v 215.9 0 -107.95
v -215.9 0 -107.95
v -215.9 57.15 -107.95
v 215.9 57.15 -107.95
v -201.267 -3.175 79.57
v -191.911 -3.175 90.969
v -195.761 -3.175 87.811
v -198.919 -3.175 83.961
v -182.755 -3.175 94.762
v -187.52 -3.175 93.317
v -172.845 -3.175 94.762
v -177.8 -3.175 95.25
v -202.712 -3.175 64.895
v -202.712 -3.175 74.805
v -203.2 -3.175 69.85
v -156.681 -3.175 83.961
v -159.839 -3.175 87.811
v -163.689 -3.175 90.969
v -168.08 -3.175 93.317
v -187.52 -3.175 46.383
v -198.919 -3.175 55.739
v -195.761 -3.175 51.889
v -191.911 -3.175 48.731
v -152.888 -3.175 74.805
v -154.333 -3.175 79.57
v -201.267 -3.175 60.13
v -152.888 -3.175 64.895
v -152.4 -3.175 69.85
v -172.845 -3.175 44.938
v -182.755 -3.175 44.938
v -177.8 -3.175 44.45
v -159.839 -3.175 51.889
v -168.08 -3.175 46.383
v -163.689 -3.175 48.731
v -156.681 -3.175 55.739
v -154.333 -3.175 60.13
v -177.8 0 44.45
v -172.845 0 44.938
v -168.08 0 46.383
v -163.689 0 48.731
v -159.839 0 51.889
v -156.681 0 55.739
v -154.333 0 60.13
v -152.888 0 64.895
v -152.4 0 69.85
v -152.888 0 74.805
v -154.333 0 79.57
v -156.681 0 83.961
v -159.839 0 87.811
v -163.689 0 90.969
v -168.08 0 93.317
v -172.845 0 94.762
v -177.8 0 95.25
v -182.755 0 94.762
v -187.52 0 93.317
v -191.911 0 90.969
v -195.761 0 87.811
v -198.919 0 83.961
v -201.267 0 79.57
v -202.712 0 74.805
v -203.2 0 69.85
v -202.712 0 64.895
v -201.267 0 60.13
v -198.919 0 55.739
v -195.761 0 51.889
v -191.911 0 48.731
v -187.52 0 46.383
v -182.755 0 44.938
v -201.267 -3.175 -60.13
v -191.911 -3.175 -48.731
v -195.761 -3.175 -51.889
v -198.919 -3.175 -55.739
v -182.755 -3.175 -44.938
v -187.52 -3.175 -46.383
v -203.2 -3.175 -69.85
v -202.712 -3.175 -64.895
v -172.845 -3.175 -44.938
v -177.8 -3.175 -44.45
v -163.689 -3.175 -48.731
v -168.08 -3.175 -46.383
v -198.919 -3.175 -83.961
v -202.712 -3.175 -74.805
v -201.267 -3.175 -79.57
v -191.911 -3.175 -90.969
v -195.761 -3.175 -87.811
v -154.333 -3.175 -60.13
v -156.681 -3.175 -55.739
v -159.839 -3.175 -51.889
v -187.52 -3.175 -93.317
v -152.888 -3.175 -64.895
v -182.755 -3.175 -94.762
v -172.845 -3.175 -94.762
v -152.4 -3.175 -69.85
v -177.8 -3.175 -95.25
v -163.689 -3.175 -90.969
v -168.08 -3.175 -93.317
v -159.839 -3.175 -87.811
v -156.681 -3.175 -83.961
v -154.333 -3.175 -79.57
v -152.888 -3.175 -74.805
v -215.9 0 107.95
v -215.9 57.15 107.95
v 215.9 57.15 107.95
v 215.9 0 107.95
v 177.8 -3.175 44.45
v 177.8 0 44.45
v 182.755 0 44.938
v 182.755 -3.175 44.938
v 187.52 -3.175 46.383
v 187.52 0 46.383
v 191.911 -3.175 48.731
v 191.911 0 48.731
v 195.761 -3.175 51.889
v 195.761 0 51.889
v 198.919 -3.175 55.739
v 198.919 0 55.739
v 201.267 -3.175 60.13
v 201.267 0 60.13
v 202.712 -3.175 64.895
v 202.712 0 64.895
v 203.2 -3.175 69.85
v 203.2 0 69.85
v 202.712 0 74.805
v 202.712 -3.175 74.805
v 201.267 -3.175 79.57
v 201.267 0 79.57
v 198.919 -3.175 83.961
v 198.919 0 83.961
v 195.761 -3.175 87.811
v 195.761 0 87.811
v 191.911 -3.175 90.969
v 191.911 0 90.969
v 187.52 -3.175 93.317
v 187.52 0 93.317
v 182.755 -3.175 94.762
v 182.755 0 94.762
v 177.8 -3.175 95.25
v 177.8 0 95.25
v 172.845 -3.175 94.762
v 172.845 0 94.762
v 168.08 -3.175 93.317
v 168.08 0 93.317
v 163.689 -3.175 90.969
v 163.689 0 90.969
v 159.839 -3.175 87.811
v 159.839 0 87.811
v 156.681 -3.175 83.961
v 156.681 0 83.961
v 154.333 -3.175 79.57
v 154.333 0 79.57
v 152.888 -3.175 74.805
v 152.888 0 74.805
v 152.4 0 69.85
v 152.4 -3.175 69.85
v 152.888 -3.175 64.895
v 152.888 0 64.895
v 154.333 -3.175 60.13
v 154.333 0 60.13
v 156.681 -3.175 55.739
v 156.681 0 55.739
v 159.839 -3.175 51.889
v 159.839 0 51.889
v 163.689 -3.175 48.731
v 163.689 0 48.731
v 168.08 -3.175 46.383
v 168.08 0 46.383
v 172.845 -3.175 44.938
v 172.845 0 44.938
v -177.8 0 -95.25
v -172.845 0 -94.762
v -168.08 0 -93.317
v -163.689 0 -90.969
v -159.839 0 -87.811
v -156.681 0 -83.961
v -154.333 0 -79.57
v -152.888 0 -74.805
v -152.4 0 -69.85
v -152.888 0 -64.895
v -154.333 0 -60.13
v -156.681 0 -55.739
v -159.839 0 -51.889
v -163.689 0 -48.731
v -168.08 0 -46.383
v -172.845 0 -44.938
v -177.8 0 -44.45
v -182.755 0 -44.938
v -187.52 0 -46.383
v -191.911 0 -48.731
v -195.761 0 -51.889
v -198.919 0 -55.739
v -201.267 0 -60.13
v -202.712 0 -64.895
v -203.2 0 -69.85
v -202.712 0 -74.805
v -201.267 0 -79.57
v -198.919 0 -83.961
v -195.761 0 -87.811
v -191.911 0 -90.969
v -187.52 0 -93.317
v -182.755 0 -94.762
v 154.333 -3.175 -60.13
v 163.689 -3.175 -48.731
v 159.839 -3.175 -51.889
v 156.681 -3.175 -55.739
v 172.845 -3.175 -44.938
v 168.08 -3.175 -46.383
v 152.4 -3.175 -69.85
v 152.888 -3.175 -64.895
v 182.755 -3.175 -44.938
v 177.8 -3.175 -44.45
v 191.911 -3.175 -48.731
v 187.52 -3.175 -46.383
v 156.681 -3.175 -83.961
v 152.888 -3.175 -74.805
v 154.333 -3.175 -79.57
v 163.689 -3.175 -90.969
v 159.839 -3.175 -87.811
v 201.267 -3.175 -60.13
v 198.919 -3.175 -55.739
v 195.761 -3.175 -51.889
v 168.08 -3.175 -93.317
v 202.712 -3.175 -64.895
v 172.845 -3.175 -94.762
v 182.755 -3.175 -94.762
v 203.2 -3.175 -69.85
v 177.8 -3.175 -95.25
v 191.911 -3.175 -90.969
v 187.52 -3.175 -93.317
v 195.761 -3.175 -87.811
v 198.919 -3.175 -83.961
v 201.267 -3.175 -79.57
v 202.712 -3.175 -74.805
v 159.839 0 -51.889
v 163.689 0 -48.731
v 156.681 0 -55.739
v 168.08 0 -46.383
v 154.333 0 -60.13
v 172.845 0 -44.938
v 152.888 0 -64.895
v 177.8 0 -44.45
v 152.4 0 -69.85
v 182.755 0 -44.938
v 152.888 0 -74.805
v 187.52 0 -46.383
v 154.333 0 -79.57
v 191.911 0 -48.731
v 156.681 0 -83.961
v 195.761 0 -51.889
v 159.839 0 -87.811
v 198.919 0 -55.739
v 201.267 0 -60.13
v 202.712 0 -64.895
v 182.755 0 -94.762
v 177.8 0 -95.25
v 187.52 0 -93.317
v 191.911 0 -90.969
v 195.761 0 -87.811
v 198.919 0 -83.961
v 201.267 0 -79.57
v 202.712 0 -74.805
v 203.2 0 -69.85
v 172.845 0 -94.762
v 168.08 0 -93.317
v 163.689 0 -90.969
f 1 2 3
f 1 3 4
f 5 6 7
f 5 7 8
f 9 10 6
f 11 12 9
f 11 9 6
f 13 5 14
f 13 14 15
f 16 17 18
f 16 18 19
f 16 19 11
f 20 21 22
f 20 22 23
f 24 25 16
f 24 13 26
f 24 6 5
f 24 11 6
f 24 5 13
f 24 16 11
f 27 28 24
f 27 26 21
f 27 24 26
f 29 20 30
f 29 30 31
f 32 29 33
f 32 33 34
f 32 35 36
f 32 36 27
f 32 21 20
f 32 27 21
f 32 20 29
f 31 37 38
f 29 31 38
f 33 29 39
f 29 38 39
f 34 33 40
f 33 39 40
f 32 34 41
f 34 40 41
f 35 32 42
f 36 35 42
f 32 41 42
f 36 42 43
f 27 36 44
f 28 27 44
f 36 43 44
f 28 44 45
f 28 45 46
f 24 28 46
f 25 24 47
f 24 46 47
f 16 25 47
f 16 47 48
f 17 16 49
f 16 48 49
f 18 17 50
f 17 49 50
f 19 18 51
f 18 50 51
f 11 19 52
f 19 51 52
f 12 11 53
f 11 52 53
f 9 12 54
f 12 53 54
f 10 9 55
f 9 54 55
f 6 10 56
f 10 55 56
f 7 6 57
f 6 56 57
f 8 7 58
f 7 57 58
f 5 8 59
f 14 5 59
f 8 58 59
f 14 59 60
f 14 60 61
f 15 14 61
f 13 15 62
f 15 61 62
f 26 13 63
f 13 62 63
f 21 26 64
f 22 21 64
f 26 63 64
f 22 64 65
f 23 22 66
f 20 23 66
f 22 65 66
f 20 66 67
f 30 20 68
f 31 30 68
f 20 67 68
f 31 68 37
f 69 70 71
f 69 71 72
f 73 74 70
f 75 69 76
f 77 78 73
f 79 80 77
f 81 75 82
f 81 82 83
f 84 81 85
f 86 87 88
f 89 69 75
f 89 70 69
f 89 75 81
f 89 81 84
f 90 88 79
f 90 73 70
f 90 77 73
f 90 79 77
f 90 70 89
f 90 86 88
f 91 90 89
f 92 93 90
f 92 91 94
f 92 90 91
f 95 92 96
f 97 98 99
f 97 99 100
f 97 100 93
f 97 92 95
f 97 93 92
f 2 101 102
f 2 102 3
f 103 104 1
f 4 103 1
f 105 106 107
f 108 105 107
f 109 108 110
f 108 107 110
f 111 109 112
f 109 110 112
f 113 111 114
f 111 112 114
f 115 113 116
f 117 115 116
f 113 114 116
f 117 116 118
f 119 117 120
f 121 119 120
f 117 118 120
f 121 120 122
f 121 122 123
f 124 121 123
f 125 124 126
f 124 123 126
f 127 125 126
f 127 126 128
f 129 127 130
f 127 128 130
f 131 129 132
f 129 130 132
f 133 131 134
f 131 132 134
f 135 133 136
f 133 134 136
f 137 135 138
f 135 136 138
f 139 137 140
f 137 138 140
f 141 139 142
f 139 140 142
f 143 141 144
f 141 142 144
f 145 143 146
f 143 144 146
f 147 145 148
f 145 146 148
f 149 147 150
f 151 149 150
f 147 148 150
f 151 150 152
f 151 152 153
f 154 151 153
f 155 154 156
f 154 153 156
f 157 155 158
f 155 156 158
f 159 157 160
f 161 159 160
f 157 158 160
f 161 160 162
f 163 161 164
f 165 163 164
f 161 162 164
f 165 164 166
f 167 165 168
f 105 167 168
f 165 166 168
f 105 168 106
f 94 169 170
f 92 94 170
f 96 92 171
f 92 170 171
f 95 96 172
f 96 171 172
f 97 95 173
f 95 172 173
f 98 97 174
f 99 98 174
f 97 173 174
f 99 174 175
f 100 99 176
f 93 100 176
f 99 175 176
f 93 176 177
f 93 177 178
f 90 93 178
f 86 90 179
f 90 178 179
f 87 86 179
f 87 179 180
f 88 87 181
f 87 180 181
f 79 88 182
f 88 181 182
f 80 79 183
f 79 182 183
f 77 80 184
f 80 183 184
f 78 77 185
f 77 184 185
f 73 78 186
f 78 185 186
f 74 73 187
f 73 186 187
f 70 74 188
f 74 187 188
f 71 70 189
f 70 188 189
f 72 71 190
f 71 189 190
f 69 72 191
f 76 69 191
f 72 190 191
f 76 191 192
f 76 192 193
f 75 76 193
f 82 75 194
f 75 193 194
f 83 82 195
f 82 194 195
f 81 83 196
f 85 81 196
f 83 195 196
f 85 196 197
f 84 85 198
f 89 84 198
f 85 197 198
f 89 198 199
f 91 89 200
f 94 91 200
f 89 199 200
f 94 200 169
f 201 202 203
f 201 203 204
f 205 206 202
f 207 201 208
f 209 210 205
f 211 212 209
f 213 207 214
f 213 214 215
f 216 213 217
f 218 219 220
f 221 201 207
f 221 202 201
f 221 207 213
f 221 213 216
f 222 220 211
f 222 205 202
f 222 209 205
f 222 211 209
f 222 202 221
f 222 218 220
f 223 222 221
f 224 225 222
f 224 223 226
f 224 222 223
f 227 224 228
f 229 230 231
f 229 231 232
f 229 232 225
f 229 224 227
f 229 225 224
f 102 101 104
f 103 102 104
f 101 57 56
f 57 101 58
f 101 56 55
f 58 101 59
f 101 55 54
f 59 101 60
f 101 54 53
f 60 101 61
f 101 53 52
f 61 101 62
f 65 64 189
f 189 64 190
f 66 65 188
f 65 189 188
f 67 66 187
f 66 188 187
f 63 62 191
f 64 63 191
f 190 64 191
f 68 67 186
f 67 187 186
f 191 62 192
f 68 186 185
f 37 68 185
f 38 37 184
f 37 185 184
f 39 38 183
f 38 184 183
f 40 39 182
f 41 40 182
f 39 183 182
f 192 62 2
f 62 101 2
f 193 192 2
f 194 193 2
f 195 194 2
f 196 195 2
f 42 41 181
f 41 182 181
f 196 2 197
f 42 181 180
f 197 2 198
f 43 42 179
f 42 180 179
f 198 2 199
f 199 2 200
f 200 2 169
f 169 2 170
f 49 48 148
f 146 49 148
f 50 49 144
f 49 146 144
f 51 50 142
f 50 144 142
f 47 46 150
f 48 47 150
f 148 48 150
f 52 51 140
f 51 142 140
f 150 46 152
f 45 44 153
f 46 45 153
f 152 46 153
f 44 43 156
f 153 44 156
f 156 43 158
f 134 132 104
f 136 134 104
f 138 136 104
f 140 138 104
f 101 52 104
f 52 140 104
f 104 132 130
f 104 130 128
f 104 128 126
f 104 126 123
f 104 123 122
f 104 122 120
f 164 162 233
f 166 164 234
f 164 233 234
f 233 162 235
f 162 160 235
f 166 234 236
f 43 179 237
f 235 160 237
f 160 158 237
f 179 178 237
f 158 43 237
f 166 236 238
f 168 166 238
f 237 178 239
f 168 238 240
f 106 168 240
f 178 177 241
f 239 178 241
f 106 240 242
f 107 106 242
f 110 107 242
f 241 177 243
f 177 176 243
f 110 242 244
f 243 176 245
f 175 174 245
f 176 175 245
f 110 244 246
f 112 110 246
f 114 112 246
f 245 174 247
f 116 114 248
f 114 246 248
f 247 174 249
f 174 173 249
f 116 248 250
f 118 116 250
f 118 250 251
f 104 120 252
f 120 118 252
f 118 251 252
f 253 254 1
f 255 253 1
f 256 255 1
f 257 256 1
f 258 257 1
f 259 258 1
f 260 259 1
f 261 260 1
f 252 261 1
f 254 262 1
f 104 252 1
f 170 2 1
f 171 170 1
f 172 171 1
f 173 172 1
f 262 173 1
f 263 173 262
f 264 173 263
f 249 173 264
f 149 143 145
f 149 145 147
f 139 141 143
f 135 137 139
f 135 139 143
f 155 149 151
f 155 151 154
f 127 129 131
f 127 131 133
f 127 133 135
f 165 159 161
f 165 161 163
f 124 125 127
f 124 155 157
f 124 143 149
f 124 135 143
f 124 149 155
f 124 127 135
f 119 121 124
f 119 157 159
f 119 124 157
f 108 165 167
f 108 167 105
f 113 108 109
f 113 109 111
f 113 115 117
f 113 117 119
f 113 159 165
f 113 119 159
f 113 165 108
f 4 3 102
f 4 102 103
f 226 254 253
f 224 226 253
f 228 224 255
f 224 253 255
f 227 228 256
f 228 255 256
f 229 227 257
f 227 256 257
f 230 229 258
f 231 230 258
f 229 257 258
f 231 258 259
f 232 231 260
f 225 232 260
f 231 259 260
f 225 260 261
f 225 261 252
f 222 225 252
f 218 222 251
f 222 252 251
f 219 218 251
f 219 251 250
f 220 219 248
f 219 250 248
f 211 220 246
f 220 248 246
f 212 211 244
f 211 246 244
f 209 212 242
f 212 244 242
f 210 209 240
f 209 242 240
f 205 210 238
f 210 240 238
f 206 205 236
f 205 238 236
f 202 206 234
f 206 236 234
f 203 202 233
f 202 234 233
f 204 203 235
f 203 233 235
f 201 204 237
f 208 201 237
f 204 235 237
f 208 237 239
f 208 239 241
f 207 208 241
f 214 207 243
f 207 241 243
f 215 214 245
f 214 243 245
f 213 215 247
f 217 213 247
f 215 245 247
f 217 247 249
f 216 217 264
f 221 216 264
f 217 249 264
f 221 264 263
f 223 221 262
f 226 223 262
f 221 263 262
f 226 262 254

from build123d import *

# Parameters (mm, degrees)
SKETCH1_W           = 431.8
SKETCH1_H           = 215.9
BOSS_EXTRUDE1_DEPTH = 57.15
SKETCH2_R           = 25.4
BOSS_EXTRUDE2_DEPTH = 3.175


with BuildPart() as part:
    # Sketch1 → Boss-Extrude1 (new body)
    with BuildSketch(Plane(origin=(0, 0, 0), x_dir=(1, 0, 0), z_dir=(0, 1, 0))):
        Rectangle(SKETCH1_W, SKETCH1_H)
    extrude(amount=BOSS_EXTRUDE1_DEPTH)

    # Sketch2 → Boss-Extrude2 (add)
    with BuildSketch(Plane.XZ):
        with Locations(Location((-177.8, 69.85, 0), (0, 0, 270))):
            Circle(SKETCH2_R)
        with Locations(Location((-177.8, -69.85, 0), (0, 0, 270))):
            Circle(SKETCH2_R)
        with Locations(Location((177.8, -69.85, 0), (0, 0, 270))):
            Circle(SKETCH2_R)
        with Locations(Location((177.8, 69.85, 0), (0, 0, 270))):
            Circle(SKETCH2_R)
    extrude(amount=BOSS_EXTRUDE2_DEPTH)


solid = part.part
